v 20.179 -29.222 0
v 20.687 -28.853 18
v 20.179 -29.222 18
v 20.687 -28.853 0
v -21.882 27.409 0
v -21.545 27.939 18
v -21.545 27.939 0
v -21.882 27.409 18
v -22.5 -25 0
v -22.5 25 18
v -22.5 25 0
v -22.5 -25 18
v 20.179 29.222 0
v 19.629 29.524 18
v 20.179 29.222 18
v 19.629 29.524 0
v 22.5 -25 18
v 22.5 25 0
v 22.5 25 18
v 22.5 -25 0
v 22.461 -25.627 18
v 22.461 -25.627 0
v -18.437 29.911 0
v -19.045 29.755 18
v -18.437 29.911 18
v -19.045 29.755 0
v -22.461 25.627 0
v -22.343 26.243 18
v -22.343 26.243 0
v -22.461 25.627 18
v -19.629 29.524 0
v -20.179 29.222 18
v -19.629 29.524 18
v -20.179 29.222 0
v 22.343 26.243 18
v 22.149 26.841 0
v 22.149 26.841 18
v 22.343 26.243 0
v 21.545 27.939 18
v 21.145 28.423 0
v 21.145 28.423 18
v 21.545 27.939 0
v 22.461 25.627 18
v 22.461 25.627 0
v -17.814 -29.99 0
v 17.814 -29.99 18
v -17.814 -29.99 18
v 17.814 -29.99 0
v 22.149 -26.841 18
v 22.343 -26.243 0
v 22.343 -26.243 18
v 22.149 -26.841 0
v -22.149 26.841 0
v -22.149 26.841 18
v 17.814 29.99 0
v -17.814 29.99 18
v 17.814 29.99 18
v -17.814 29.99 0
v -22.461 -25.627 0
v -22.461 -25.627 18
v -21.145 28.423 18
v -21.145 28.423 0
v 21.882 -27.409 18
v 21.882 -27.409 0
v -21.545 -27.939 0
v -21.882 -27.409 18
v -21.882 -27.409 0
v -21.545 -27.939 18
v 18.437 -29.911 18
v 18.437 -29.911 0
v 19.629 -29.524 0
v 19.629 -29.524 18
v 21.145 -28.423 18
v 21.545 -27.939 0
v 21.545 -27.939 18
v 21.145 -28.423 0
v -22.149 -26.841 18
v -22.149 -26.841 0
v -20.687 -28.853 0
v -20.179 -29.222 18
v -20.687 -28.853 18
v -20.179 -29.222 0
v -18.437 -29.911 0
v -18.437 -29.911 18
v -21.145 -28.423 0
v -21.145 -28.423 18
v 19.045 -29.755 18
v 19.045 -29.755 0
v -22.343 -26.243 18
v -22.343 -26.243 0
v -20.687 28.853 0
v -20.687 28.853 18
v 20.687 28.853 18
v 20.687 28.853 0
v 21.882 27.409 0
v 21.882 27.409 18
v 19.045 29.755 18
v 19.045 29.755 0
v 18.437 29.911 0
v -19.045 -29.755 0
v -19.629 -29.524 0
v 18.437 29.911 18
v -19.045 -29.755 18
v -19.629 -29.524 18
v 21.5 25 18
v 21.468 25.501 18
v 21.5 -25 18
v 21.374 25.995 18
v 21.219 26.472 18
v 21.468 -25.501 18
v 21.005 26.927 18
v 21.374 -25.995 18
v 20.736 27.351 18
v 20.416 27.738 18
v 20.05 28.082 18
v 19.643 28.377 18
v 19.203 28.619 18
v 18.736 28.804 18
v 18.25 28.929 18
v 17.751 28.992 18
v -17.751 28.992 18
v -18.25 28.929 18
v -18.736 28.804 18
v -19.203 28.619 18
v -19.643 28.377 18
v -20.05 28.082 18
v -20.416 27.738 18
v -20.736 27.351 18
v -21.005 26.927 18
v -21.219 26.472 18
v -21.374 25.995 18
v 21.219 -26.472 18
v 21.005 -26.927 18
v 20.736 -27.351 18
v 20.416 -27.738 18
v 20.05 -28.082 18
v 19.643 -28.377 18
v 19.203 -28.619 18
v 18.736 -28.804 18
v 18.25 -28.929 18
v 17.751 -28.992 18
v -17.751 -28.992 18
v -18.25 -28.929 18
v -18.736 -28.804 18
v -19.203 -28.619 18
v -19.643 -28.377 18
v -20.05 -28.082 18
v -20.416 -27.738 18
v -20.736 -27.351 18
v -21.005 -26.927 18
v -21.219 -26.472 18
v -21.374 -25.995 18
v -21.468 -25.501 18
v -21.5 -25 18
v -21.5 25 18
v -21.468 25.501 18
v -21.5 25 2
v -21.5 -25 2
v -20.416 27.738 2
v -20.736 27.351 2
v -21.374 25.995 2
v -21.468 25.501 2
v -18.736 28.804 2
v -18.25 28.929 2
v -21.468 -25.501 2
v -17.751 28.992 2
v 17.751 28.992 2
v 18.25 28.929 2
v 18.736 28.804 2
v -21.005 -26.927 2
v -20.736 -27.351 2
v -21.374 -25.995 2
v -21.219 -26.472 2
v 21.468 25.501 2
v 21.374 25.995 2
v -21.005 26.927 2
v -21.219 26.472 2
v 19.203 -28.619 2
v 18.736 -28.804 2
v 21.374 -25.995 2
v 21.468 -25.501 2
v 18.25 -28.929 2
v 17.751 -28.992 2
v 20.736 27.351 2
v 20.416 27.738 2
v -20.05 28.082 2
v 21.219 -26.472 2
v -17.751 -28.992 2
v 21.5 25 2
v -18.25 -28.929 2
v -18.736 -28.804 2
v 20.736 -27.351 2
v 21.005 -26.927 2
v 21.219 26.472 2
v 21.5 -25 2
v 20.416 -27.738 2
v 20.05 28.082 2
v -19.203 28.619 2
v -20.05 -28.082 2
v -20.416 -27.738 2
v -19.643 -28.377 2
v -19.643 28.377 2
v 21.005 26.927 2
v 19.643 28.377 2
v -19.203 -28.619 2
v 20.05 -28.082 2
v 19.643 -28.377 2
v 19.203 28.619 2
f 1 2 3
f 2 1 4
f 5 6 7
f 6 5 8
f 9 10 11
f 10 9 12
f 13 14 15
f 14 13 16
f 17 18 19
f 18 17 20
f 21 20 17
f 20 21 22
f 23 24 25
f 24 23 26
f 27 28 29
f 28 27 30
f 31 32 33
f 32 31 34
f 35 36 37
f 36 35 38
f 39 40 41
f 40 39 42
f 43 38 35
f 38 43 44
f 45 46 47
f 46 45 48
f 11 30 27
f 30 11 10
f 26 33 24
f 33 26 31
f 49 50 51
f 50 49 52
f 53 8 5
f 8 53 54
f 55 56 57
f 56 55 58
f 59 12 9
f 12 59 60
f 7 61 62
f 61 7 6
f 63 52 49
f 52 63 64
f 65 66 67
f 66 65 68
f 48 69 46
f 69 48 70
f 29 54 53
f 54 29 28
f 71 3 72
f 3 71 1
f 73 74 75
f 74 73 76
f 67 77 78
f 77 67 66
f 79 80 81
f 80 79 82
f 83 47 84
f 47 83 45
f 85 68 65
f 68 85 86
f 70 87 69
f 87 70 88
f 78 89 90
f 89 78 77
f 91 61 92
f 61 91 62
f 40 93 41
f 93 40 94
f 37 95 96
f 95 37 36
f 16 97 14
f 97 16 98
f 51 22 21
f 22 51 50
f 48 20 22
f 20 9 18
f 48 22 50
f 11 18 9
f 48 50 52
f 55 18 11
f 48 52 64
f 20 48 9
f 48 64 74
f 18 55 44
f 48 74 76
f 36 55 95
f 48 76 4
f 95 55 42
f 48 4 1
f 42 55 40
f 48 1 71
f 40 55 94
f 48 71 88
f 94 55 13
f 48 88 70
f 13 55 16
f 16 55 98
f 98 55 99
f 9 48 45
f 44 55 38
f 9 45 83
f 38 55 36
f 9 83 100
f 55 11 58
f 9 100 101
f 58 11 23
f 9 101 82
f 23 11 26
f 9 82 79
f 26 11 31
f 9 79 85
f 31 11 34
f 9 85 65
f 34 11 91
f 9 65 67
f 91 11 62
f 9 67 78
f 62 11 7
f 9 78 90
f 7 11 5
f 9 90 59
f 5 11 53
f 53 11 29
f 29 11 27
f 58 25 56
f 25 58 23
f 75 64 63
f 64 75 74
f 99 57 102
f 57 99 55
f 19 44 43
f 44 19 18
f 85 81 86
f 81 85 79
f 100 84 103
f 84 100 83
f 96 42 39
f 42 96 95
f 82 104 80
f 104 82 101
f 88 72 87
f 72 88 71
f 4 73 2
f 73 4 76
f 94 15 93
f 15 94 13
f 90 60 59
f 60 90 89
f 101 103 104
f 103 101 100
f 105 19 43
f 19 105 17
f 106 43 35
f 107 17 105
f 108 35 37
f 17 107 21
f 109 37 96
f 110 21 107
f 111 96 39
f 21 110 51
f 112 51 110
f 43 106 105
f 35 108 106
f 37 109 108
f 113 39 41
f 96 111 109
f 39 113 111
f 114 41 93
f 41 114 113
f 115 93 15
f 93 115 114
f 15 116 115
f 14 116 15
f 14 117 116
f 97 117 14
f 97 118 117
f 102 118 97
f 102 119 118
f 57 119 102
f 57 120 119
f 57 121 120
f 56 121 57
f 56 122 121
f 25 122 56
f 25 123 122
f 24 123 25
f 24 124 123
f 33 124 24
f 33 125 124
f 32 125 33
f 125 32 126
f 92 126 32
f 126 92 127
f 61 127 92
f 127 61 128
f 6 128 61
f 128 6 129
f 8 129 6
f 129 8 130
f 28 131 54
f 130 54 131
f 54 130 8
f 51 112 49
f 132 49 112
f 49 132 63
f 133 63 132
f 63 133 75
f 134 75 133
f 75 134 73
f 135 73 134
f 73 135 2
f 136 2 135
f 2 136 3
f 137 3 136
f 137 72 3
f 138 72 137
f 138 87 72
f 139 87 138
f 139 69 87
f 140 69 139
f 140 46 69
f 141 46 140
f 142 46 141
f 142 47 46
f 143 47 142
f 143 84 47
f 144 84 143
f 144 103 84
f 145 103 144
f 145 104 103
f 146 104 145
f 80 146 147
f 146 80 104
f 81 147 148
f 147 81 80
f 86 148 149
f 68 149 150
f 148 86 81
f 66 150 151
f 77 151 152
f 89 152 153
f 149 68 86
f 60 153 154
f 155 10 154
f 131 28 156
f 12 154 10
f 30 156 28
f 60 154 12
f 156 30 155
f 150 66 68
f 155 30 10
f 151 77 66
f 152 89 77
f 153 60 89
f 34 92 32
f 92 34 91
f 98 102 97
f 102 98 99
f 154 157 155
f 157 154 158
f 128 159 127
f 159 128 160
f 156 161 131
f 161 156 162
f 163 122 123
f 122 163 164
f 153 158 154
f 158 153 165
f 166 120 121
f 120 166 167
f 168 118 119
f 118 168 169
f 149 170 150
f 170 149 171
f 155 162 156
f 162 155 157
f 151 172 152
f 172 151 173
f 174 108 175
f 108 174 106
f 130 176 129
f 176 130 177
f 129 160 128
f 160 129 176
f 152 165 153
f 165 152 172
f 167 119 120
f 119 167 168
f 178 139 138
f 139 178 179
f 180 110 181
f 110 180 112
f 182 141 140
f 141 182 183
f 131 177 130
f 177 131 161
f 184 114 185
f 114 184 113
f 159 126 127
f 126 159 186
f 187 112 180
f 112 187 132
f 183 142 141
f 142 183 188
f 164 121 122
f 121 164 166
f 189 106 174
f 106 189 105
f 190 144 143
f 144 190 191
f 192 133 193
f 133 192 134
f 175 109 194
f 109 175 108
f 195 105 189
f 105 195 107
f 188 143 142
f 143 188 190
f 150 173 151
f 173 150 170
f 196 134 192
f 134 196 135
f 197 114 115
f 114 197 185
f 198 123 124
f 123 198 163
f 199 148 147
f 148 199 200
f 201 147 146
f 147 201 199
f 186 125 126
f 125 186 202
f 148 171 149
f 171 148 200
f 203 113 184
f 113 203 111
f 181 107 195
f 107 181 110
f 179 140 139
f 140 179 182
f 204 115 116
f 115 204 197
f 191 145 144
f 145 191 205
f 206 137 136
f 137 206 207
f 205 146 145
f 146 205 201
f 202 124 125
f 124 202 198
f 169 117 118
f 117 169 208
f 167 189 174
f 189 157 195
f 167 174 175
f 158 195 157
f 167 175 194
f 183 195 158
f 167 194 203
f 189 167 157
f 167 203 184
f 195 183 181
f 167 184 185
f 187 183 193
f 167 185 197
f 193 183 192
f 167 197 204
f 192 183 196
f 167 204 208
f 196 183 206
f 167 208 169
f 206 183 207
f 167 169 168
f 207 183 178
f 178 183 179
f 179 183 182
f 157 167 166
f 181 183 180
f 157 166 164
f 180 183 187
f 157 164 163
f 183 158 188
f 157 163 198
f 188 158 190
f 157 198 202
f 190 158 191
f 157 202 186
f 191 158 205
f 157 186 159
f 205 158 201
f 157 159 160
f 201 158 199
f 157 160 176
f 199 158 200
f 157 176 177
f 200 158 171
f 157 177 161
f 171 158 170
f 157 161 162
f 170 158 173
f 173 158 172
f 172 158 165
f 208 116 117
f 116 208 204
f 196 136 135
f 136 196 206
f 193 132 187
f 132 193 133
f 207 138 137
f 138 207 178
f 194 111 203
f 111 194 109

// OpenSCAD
$fn = 50;


difference() {
	union() {
		hull() {
			translate(v = [-17.5000000000, 25.0000000000, 0]) {
				cylinder(h = 18, r = 5);
			}
			translate(v = [17.5000000000, 25.0000000000, 0]) {
				cylinder(h = 18, r = 5);
			}
			translate(v = [-17.5000000000, -25.0000000000, 0]) {
				cylinder(h = 18, r = 5);
			}
			translate(v = [17.5000000000, -25.0000000000, 0]) {
				cylinder(h = 18, r = 5);
			}
		}
	}
	union() {
		translate(v = [0, 0, 2]) {
			hull() {
				translate(v = [-17.5000000000, 25.0000000000, 0]) {
					cylinder(h = 16, r = 4);
				}
				translate(v = [17.5000000000, 25.0000000000, 0]) {
					cylinder(h = 16, r = 4);
				}
				translate(v = [-17.5000000000, -25.0000000000, 0]) {
					cylinder(h = 16, r = 4);
				}
				translate(v = [17.5000000000, -25.0000000000, 0]) {
					cylinder(h = 16, r = 4);
				}
			}
		}
	}
}
